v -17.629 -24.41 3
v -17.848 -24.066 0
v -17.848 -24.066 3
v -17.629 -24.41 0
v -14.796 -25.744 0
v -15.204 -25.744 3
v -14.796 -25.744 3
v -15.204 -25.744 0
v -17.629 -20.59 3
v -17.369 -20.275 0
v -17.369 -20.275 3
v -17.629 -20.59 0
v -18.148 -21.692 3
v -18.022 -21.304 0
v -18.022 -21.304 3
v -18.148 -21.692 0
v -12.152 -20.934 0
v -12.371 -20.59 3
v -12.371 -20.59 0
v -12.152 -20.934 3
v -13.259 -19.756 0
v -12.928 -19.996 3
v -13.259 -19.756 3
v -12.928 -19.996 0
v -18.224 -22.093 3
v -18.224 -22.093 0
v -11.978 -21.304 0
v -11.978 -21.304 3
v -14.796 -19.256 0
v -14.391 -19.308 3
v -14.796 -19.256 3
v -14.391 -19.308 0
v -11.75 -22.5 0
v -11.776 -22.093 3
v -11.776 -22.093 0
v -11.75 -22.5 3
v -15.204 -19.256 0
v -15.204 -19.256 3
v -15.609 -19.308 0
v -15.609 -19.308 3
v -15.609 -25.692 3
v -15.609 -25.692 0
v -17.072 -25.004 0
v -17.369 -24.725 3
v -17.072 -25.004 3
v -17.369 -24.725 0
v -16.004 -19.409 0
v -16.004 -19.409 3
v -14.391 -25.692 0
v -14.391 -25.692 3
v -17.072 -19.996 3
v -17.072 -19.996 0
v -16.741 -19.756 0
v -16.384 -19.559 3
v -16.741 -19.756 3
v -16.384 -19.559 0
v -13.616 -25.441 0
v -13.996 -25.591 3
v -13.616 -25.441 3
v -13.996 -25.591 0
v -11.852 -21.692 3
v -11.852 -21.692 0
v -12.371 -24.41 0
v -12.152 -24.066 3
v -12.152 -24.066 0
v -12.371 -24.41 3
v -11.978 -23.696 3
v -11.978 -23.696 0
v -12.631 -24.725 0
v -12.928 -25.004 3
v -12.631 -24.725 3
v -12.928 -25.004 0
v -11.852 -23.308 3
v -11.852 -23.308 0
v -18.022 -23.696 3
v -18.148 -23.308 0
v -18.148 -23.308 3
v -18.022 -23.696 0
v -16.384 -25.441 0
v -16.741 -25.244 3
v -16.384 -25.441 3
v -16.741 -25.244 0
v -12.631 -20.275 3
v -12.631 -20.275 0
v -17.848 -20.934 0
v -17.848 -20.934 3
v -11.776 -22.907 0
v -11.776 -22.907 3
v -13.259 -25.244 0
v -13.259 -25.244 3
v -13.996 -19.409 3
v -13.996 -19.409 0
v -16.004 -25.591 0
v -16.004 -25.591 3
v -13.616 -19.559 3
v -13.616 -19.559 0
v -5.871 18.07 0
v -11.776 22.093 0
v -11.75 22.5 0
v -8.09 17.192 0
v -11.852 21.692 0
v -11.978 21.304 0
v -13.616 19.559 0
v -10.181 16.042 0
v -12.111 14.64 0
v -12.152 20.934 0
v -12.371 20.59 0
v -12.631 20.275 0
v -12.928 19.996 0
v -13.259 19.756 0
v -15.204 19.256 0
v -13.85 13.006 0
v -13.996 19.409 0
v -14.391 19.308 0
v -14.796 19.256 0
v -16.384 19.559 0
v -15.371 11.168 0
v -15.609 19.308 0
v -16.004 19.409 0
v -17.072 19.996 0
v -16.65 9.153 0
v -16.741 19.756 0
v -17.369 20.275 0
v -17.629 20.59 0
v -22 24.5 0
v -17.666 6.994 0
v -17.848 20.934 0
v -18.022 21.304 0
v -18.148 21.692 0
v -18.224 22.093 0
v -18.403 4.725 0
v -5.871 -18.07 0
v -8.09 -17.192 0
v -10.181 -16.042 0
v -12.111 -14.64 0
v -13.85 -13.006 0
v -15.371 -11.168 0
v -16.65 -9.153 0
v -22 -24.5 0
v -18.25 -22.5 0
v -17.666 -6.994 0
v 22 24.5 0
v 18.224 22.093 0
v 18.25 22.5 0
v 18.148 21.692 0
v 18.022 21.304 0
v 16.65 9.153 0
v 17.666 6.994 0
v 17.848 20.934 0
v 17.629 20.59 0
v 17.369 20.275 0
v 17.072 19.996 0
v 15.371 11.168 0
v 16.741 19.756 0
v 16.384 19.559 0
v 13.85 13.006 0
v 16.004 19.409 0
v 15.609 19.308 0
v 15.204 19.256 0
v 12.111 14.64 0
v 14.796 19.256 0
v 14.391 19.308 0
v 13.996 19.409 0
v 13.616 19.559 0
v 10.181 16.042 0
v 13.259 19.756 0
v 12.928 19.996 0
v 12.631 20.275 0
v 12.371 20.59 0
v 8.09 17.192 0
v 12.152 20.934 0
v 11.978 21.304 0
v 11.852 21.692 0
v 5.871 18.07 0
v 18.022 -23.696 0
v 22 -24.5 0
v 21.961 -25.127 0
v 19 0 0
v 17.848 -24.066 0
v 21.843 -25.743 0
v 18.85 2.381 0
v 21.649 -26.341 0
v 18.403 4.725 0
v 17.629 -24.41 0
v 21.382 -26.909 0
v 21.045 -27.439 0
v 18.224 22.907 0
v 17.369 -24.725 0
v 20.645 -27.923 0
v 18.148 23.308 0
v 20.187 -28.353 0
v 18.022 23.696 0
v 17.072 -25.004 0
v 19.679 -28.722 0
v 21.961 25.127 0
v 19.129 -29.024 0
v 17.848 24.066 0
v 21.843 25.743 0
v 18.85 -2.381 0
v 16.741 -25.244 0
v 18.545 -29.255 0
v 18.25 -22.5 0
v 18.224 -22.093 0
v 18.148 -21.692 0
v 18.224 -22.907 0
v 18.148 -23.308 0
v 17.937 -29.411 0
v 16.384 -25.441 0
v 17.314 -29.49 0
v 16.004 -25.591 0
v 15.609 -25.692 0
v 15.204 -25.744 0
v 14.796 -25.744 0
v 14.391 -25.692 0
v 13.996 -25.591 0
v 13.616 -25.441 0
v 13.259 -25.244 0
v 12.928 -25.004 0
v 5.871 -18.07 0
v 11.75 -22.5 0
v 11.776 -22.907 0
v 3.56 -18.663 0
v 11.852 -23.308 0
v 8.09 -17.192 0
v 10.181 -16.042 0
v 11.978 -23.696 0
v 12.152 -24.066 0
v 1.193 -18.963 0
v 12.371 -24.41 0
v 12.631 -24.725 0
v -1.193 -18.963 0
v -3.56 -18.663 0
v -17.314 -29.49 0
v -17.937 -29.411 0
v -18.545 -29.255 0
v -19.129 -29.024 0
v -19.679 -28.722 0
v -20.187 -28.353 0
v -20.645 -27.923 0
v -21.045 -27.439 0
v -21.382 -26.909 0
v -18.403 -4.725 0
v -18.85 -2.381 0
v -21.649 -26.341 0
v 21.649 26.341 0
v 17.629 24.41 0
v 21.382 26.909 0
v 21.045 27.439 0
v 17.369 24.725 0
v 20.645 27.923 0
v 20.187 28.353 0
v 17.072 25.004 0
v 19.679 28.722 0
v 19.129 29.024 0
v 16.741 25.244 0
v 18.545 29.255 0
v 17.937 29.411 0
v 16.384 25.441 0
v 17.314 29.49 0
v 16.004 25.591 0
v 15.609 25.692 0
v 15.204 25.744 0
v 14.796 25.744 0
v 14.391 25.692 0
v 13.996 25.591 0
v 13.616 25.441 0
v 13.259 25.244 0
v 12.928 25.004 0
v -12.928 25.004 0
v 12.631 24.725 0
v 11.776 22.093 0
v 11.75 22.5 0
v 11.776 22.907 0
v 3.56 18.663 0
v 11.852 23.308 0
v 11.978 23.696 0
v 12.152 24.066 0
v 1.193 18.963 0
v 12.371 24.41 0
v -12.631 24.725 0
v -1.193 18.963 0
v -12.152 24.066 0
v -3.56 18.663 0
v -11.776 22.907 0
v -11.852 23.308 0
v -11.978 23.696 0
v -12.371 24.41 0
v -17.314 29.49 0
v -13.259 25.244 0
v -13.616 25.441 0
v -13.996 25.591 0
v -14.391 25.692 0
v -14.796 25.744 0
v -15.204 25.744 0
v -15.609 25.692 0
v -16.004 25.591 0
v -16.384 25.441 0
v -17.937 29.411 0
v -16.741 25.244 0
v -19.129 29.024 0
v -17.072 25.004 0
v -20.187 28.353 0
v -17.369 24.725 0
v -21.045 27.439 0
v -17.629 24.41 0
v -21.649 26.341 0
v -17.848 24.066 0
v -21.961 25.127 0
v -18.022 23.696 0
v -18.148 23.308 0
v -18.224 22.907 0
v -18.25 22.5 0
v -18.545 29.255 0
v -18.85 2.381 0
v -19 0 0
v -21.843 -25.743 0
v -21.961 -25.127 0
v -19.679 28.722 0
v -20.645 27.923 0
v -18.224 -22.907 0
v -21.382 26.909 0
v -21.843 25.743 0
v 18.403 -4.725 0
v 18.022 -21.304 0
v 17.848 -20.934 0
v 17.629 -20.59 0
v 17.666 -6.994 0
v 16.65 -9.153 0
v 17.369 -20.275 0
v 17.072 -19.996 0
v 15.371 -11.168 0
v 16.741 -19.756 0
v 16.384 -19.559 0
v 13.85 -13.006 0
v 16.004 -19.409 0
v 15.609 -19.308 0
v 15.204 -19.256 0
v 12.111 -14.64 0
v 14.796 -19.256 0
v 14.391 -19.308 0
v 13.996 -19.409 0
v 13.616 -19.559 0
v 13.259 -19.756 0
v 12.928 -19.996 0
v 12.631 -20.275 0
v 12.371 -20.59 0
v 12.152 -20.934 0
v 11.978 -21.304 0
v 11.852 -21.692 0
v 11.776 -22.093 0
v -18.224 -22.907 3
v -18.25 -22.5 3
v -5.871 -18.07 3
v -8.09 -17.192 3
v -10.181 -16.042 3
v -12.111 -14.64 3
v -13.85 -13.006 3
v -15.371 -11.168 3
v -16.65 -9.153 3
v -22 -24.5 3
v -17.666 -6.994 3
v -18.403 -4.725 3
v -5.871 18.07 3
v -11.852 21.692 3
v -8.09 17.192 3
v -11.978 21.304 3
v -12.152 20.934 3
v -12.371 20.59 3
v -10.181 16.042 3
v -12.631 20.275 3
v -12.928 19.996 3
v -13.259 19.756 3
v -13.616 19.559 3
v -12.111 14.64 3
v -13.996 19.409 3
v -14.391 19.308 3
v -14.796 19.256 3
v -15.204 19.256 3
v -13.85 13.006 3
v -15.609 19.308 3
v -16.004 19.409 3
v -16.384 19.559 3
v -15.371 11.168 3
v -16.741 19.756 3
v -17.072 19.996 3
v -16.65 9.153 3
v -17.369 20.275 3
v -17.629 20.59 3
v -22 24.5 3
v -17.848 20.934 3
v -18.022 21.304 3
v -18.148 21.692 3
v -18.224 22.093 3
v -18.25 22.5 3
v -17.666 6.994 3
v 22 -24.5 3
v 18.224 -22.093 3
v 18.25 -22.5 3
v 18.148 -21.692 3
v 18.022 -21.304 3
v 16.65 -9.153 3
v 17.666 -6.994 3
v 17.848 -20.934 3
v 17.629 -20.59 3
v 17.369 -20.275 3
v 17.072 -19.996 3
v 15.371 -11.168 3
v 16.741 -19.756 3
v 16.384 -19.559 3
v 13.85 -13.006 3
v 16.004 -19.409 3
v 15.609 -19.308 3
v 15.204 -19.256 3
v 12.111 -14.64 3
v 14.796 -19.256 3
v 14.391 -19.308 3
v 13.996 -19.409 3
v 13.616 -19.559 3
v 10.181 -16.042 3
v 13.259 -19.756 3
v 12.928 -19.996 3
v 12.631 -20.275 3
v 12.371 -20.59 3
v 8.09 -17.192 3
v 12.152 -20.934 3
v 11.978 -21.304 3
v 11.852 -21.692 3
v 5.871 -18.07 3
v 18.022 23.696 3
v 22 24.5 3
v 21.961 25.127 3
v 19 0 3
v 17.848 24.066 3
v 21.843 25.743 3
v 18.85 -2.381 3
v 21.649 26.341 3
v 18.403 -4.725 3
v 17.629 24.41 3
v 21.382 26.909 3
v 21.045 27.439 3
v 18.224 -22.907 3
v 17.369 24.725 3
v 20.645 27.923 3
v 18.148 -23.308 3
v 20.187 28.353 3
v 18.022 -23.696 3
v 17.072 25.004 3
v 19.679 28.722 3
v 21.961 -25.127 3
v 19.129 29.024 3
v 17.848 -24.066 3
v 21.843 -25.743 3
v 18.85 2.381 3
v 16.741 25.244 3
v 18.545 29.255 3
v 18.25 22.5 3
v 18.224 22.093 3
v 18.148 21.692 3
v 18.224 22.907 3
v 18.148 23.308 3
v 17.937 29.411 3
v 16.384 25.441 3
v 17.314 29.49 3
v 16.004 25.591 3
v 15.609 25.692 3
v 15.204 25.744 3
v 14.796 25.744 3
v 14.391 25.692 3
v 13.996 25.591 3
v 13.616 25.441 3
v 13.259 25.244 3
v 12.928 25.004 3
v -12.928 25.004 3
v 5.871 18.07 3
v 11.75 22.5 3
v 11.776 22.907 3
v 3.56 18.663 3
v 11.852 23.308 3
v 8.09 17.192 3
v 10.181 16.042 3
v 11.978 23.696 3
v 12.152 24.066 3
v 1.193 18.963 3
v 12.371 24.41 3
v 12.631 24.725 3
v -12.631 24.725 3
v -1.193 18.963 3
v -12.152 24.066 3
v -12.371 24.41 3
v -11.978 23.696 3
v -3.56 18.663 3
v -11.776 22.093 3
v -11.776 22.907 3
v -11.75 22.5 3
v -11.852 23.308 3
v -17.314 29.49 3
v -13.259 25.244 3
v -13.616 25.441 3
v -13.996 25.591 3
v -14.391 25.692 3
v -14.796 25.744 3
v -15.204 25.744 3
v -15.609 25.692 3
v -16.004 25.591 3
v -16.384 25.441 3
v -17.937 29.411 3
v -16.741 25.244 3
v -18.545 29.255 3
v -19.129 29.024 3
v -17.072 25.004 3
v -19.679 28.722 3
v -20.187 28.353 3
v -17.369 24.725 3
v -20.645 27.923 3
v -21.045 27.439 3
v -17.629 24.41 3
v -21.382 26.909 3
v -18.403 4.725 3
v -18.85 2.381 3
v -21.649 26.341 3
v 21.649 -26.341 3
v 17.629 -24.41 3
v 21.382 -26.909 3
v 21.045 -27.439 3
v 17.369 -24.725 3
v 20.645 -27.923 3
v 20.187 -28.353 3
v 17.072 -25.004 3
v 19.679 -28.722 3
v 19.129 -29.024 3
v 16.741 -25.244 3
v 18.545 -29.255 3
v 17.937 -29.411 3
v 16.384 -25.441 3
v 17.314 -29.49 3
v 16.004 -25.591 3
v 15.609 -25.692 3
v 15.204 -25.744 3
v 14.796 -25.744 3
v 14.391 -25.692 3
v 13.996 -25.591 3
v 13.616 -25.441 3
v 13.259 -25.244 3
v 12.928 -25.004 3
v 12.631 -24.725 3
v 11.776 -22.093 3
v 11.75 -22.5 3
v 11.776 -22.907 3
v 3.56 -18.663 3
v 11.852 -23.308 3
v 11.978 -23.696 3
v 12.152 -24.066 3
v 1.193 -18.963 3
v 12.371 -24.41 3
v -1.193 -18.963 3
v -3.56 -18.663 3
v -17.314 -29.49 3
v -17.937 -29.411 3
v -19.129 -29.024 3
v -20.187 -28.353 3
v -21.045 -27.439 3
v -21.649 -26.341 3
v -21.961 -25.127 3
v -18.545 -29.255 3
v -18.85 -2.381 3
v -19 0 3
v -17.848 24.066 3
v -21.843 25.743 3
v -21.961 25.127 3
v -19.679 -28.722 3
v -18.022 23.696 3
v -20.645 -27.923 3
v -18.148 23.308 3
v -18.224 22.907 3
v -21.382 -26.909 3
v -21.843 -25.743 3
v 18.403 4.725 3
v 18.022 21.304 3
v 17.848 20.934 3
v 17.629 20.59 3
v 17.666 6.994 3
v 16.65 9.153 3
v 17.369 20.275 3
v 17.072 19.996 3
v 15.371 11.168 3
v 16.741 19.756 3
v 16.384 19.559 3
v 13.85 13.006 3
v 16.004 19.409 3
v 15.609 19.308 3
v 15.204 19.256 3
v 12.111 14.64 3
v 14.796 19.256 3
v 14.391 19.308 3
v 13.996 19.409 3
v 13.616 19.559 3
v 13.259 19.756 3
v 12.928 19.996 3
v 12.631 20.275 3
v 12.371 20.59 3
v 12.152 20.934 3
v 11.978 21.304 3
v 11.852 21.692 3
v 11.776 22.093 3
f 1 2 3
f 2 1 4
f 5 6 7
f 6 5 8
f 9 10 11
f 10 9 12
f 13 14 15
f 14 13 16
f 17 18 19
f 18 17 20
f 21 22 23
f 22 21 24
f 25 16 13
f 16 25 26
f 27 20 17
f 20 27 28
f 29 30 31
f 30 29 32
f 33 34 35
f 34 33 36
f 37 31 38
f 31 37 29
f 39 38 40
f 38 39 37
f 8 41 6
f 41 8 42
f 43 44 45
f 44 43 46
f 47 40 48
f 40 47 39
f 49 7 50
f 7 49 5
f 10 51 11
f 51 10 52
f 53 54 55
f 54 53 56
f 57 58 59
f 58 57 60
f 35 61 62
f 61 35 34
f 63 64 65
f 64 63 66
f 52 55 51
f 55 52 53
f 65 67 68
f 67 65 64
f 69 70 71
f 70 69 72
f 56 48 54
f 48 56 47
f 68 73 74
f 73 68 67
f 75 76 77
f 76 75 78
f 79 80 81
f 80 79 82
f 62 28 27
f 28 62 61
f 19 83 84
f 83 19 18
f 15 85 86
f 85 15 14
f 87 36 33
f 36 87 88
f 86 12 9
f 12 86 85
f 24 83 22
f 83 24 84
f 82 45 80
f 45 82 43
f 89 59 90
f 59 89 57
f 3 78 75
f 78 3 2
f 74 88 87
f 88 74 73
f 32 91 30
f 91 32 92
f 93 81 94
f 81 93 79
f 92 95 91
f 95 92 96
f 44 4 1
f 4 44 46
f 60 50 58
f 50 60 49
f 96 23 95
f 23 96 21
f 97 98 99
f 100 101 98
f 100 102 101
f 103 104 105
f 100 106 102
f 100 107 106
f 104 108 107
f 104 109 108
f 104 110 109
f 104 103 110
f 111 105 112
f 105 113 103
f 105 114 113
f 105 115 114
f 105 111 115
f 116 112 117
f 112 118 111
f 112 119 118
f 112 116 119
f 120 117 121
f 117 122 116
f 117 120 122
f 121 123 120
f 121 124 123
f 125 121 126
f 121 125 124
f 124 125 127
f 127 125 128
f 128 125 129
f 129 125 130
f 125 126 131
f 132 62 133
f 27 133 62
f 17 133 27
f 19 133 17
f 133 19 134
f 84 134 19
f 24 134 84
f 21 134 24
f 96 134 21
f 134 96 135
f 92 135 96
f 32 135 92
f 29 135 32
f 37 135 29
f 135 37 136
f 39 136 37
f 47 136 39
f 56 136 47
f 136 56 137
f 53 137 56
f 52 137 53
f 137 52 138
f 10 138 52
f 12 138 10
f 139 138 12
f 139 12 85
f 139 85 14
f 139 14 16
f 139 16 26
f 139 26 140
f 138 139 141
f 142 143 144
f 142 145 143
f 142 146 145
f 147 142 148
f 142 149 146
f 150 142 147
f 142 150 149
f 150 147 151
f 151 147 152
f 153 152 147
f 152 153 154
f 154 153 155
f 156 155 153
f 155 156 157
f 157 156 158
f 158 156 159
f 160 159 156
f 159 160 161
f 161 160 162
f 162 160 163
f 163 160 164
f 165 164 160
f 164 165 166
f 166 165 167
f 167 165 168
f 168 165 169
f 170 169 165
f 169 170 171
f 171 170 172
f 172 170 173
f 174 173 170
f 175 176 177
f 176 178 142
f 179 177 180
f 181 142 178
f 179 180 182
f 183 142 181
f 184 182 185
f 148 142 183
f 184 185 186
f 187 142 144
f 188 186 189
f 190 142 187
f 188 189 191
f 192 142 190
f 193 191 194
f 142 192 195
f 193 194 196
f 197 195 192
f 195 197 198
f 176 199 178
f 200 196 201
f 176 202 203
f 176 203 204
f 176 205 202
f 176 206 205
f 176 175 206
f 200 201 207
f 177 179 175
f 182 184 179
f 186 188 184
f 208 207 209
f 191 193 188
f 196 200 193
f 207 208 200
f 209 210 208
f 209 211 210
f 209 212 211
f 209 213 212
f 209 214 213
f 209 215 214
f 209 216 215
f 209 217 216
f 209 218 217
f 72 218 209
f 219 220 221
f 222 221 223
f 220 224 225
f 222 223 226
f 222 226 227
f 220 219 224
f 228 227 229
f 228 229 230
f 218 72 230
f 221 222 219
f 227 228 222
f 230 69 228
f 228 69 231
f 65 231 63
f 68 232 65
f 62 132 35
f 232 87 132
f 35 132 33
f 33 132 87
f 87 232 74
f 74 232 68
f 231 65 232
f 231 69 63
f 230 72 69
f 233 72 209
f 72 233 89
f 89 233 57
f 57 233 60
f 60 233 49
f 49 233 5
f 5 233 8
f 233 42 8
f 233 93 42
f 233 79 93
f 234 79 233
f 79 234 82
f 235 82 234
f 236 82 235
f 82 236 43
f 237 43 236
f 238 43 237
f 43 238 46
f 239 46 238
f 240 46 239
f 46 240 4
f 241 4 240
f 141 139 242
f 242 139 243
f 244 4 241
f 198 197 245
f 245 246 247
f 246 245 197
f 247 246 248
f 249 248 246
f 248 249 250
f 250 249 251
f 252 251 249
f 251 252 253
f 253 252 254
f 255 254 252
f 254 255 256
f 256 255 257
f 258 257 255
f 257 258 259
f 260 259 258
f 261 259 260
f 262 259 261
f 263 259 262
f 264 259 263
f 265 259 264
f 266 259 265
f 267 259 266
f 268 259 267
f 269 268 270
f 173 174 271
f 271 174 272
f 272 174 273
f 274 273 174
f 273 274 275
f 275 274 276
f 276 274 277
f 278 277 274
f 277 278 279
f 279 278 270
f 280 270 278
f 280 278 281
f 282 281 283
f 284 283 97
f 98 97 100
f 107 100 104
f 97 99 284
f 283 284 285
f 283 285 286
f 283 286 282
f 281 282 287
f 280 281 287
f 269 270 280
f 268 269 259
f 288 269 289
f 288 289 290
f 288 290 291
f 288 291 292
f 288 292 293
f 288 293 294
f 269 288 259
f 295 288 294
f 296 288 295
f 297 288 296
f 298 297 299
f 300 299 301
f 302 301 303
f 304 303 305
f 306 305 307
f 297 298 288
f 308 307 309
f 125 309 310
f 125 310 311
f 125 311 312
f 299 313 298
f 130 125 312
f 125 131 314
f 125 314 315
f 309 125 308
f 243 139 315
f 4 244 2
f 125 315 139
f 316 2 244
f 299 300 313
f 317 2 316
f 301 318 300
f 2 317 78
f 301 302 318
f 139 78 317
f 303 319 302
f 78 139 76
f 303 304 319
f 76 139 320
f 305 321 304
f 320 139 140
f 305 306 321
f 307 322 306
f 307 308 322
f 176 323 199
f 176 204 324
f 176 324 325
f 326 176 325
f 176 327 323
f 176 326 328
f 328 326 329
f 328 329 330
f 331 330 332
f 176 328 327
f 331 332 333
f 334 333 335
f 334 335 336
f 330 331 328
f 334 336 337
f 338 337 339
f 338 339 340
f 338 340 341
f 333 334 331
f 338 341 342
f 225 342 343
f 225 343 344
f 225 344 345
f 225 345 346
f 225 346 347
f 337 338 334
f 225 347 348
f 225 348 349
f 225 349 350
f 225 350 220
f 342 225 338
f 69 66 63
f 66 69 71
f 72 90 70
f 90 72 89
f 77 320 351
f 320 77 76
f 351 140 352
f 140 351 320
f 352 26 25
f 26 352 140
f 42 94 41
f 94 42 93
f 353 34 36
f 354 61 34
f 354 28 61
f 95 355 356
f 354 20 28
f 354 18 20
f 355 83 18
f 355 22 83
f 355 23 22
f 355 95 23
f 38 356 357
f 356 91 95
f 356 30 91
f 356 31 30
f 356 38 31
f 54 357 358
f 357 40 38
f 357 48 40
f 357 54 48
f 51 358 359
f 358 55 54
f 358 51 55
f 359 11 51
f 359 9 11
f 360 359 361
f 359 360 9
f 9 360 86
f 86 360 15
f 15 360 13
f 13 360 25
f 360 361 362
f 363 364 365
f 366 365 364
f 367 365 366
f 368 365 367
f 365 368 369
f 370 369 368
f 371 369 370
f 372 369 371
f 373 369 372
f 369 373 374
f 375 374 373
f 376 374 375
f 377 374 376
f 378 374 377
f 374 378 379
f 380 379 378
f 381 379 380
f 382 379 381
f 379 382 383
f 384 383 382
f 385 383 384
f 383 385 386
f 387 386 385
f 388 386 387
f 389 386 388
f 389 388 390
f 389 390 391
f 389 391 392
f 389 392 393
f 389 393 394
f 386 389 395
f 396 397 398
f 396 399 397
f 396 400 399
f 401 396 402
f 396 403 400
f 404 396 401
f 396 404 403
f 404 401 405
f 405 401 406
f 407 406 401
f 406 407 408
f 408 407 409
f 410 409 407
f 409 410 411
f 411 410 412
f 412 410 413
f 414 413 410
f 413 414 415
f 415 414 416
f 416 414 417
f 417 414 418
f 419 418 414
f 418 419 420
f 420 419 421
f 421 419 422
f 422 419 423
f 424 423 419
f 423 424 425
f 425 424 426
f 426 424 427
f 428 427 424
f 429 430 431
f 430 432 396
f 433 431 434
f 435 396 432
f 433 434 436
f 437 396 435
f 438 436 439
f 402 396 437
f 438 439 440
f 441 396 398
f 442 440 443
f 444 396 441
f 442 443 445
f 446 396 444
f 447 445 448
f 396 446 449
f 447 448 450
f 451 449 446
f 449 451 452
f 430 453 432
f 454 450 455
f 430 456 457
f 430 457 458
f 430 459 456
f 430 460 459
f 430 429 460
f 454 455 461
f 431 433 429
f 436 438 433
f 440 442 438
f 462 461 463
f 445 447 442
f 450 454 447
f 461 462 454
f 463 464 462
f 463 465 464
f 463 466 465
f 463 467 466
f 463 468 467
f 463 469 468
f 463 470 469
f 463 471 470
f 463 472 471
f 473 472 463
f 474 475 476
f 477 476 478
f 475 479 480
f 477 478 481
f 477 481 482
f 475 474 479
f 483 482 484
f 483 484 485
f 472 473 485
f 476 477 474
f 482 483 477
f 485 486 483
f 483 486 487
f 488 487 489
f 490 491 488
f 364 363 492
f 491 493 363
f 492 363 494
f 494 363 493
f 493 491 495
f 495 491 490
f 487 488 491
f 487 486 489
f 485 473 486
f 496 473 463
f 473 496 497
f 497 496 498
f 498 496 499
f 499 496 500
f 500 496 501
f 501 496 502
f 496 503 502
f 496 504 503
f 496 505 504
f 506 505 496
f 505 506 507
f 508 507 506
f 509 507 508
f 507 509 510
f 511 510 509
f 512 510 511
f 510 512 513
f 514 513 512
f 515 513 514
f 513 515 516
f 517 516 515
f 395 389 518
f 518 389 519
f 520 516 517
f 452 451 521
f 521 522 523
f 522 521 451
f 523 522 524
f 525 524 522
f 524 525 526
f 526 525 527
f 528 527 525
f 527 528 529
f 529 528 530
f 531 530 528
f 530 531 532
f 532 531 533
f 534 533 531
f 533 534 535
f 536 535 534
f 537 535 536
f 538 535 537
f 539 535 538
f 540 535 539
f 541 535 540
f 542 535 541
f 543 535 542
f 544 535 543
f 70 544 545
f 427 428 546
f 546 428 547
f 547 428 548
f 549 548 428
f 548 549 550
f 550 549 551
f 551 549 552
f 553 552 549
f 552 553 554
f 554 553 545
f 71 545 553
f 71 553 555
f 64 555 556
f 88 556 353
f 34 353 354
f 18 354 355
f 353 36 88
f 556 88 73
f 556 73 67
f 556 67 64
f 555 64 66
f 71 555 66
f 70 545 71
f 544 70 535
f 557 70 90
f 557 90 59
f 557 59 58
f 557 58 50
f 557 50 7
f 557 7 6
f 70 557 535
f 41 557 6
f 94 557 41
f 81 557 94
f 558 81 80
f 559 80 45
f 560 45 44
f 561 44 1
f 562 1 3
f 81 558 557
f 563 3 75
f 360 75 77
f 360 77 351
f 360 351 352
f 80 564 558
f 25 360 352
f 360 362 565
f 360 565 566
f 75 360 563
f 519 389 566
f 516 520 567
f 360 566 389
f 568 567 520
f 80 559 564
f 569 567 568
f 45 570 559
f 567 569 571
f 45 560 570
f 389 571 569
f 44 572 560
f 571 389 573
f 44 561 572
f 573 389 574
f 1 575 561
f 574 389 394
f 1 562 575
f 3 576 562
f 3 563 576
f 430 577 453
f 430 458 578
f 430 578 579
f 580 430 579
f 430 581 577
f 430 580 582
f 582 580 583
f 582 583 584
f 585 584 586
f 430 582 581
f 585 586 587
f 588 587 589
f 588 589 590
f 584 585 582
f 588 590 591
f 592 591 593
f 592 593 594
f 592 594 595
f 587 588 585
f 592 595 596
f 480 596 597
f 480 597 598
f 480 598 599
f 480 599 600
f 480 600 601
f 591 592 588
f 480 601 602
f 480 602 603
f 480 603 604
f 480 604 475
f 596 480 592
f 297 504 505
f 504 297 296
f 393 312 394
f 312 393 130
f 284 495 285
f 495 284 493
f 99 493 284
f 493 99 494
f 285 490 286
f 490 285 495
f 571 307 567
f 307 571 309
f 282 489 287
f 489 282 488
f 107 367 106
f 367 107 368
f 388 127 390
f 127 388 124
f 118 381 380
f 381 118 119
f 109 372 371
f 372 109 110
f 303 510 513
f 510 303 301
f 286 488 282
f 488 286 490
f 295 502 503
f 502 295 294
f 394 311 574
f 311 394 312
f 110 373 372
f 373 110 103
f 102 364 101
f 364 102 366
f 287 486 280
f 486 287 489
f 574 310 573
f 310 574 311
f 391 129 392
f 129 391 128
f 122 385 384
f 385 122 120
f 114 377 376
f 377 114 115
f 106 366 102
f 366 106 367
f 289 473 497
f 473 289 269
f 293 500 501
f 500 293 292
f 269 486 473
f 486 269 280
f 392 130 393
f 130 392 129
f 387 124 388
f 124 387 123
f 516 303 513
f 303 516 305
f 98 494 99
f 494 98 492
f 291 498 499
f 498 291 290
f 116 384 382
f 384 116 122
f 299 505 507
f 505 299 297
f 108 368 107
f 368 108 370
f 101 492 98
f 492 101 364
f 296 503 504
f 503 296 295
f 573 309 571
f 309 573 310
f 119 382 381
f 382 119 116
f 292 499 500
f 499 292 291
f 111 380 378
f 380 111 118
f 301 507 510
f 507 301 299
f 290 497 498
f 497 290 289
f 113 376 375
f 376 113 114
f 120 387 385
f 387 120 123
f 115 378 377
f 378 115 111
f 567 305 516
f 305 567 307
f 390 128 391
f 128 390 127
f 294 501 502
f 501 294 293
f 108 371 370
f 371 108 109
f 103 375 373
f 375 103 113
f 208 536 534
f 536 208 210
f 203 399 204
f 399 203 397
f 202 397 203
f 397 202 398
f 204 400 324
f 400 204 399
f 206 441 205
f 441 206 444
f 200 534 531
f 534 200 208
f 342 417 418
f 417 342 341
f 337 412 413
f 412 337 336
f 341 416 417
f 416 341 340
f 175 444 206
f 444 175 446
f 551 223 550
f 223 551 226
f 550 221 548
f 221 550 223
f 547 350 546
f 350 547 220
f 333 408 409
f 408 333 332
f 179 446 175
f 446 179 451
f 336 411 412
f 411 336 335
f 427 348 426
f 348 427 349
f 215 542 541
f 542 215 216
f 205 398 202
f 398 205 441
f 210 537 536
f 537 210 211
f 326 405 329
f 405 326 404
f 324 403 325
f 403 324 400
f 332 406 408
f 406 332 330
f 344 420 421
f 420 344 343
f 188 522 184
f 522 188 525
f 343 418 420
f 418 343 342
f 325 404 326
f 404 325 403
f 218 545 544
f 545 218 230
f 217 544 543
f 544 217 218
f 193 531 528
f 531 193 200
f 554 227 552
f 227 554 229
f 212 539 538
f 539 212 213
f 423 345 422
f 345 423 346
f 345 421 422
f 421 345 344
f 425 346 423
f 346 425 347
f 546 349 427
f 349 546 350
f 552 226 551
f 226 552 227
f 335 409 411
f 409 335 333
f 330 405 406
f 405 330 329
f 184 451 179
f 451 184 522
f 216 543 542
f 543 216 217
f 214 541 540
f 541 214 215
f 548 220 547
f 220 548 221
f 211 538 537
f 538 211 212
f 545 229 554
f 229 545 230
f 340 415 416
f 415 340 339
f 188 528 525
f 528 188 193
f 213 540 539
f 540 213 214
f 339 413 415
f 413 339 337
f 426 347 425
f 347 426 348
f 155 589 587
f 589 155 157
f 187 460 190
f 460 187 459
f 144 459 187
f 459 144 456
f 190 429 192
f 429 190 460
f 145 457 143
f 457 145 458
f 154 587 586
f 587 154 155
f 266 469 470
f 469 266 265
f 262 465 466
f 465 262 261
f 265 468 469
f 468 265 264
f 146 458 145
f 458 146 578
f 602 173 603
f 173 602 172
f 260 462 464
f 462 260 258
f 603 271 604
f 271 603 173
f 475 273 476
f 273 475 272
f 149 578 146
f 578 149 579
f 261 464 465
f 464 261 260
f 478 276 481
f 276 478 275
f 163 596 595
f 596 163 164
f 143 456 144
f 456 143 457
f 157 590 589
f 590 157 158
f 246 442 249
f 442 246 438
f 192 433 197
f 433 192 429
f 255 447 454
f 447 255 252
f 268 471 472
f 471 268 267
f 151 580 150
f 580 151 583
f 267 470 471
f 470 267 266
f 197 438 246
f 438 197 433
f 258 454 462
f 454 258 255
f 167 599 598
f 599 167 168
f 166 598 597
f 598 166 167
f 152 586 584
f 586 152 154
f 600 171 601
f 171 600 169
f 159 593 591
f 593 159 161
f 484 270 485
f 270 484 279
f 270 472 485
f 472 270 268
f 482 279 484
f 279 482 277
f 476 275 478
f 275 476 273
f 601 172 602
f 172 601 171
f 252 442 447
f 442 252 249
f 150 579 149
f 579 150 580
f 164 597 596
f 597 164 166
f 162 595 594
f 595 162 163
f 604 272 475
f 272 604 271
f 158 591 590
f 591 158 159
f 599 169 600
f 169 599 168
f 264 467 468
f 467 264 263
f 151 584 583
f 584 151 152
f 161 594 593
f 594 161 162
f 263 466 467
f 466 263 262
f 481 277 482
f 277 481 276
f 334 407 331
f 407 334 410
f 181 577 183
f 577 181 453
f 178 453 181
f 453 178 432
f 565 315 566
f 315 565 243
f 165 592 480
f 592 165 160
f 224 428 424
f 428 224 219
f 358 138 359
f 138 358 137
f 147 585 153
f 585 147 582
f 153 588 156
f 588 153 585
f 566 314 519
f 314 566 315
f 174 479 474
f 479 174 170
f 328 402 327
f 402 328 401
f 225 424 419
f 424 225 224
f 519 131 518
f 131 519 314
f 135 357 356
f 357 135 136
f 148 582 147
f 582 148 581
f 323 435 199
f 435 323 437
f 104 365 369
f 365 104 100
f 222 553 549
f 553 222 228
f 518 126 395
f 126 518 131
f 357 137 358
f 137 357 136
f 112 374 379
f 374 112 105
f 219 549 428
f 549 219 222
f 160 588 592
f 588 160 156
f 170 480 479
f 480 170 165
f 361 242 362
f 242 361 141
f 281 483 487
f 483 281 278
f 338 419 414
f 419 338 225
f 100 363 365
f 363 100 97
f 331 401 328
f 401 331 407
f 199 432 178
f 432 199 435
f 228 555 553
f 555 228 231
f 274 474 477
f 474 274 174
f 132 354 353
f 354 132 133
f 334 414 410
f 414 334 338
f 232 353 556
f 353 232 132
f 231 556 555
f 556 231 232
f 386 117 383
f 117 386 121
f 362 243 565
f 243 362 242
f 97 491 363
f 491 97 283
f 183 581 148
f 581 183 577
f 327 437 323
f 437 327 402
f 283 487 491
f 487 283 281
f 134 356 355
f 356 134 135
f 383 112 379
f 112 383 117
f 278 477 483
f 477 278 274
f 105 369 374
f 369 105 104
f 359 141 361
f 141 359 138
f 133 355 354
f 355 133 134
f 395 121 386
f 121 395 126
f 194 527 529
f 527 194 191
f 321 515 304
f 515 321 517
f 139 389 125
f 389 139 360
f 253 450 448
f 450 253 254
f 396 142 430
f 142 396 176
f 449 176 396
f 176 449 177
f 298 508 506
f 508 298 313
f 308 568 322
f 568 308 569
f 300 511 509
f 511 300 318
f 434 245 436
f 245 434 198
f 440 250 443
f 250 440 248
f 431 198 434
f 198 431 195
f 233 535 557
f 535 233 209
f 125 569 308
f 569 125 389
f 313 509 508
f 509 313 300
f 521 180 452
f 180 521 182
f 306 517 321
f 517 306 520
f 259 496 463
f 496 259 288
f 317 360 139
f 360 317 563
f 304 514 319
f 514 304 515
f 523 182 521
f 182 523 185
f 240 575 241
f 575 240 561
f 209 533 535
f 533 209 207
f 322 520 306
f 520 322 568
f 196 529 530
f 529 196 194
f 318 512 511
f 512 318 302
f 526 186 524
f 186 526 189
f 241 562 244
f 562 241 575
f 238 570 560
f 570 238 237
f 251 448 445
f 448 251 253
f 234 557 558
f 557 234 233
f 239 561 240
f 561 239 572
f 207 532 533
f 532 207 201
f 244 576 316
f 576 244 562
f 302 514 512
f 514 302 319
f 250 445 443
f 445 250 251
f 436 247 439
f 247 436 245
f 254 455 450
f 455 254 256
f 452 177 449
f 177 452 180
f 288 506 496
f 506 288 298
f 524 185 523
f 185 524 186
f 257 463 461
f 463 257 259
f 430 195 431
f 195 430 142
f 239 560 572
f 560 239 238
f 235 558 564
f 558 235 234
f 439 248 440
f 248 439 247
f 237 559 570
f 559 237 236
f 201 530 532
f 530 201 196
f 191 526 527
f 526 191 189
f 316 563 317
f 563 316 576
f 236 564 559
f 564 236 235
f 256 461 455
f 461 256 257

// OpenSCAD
$fn = 50;

difference() {
	union() {
		hull() {
			translate(v = [-17.0, 24.5, 0]) {
				cylinder(h = 3, r = 5);
			}
			translate(v = [17.0, 24.5, 0]) {
				cylinder(h = 3, r = 5);
			}
			translate(v = [-17.0, -24.5, 0]) {
				cylinder(h = 3, r = 5);
			}
			translate(v = [17.0, -24.5, 0]) {
				cylinder(h = 3, r = 5);
			}
		}
	}
	union() {
		translate(v = [-15.0, -22.5, 0]) {
			cylinder(h = 3, r = 3.25);
		}
		translate(v = [-15.0, 22.5, 0]) {
			cylinder(h = 3, r = 3.25);
		}
		translate(v = [15.0, -22.5, 0]) {
			cylinder(h = 3, r = 3.25);
		}
		translate(v = [15.0, 22.5, 0]) {
			cylinder(h = 3, r = 3.25);
		}
		cylinder(h = 3, r = 19.0);
	}
}
